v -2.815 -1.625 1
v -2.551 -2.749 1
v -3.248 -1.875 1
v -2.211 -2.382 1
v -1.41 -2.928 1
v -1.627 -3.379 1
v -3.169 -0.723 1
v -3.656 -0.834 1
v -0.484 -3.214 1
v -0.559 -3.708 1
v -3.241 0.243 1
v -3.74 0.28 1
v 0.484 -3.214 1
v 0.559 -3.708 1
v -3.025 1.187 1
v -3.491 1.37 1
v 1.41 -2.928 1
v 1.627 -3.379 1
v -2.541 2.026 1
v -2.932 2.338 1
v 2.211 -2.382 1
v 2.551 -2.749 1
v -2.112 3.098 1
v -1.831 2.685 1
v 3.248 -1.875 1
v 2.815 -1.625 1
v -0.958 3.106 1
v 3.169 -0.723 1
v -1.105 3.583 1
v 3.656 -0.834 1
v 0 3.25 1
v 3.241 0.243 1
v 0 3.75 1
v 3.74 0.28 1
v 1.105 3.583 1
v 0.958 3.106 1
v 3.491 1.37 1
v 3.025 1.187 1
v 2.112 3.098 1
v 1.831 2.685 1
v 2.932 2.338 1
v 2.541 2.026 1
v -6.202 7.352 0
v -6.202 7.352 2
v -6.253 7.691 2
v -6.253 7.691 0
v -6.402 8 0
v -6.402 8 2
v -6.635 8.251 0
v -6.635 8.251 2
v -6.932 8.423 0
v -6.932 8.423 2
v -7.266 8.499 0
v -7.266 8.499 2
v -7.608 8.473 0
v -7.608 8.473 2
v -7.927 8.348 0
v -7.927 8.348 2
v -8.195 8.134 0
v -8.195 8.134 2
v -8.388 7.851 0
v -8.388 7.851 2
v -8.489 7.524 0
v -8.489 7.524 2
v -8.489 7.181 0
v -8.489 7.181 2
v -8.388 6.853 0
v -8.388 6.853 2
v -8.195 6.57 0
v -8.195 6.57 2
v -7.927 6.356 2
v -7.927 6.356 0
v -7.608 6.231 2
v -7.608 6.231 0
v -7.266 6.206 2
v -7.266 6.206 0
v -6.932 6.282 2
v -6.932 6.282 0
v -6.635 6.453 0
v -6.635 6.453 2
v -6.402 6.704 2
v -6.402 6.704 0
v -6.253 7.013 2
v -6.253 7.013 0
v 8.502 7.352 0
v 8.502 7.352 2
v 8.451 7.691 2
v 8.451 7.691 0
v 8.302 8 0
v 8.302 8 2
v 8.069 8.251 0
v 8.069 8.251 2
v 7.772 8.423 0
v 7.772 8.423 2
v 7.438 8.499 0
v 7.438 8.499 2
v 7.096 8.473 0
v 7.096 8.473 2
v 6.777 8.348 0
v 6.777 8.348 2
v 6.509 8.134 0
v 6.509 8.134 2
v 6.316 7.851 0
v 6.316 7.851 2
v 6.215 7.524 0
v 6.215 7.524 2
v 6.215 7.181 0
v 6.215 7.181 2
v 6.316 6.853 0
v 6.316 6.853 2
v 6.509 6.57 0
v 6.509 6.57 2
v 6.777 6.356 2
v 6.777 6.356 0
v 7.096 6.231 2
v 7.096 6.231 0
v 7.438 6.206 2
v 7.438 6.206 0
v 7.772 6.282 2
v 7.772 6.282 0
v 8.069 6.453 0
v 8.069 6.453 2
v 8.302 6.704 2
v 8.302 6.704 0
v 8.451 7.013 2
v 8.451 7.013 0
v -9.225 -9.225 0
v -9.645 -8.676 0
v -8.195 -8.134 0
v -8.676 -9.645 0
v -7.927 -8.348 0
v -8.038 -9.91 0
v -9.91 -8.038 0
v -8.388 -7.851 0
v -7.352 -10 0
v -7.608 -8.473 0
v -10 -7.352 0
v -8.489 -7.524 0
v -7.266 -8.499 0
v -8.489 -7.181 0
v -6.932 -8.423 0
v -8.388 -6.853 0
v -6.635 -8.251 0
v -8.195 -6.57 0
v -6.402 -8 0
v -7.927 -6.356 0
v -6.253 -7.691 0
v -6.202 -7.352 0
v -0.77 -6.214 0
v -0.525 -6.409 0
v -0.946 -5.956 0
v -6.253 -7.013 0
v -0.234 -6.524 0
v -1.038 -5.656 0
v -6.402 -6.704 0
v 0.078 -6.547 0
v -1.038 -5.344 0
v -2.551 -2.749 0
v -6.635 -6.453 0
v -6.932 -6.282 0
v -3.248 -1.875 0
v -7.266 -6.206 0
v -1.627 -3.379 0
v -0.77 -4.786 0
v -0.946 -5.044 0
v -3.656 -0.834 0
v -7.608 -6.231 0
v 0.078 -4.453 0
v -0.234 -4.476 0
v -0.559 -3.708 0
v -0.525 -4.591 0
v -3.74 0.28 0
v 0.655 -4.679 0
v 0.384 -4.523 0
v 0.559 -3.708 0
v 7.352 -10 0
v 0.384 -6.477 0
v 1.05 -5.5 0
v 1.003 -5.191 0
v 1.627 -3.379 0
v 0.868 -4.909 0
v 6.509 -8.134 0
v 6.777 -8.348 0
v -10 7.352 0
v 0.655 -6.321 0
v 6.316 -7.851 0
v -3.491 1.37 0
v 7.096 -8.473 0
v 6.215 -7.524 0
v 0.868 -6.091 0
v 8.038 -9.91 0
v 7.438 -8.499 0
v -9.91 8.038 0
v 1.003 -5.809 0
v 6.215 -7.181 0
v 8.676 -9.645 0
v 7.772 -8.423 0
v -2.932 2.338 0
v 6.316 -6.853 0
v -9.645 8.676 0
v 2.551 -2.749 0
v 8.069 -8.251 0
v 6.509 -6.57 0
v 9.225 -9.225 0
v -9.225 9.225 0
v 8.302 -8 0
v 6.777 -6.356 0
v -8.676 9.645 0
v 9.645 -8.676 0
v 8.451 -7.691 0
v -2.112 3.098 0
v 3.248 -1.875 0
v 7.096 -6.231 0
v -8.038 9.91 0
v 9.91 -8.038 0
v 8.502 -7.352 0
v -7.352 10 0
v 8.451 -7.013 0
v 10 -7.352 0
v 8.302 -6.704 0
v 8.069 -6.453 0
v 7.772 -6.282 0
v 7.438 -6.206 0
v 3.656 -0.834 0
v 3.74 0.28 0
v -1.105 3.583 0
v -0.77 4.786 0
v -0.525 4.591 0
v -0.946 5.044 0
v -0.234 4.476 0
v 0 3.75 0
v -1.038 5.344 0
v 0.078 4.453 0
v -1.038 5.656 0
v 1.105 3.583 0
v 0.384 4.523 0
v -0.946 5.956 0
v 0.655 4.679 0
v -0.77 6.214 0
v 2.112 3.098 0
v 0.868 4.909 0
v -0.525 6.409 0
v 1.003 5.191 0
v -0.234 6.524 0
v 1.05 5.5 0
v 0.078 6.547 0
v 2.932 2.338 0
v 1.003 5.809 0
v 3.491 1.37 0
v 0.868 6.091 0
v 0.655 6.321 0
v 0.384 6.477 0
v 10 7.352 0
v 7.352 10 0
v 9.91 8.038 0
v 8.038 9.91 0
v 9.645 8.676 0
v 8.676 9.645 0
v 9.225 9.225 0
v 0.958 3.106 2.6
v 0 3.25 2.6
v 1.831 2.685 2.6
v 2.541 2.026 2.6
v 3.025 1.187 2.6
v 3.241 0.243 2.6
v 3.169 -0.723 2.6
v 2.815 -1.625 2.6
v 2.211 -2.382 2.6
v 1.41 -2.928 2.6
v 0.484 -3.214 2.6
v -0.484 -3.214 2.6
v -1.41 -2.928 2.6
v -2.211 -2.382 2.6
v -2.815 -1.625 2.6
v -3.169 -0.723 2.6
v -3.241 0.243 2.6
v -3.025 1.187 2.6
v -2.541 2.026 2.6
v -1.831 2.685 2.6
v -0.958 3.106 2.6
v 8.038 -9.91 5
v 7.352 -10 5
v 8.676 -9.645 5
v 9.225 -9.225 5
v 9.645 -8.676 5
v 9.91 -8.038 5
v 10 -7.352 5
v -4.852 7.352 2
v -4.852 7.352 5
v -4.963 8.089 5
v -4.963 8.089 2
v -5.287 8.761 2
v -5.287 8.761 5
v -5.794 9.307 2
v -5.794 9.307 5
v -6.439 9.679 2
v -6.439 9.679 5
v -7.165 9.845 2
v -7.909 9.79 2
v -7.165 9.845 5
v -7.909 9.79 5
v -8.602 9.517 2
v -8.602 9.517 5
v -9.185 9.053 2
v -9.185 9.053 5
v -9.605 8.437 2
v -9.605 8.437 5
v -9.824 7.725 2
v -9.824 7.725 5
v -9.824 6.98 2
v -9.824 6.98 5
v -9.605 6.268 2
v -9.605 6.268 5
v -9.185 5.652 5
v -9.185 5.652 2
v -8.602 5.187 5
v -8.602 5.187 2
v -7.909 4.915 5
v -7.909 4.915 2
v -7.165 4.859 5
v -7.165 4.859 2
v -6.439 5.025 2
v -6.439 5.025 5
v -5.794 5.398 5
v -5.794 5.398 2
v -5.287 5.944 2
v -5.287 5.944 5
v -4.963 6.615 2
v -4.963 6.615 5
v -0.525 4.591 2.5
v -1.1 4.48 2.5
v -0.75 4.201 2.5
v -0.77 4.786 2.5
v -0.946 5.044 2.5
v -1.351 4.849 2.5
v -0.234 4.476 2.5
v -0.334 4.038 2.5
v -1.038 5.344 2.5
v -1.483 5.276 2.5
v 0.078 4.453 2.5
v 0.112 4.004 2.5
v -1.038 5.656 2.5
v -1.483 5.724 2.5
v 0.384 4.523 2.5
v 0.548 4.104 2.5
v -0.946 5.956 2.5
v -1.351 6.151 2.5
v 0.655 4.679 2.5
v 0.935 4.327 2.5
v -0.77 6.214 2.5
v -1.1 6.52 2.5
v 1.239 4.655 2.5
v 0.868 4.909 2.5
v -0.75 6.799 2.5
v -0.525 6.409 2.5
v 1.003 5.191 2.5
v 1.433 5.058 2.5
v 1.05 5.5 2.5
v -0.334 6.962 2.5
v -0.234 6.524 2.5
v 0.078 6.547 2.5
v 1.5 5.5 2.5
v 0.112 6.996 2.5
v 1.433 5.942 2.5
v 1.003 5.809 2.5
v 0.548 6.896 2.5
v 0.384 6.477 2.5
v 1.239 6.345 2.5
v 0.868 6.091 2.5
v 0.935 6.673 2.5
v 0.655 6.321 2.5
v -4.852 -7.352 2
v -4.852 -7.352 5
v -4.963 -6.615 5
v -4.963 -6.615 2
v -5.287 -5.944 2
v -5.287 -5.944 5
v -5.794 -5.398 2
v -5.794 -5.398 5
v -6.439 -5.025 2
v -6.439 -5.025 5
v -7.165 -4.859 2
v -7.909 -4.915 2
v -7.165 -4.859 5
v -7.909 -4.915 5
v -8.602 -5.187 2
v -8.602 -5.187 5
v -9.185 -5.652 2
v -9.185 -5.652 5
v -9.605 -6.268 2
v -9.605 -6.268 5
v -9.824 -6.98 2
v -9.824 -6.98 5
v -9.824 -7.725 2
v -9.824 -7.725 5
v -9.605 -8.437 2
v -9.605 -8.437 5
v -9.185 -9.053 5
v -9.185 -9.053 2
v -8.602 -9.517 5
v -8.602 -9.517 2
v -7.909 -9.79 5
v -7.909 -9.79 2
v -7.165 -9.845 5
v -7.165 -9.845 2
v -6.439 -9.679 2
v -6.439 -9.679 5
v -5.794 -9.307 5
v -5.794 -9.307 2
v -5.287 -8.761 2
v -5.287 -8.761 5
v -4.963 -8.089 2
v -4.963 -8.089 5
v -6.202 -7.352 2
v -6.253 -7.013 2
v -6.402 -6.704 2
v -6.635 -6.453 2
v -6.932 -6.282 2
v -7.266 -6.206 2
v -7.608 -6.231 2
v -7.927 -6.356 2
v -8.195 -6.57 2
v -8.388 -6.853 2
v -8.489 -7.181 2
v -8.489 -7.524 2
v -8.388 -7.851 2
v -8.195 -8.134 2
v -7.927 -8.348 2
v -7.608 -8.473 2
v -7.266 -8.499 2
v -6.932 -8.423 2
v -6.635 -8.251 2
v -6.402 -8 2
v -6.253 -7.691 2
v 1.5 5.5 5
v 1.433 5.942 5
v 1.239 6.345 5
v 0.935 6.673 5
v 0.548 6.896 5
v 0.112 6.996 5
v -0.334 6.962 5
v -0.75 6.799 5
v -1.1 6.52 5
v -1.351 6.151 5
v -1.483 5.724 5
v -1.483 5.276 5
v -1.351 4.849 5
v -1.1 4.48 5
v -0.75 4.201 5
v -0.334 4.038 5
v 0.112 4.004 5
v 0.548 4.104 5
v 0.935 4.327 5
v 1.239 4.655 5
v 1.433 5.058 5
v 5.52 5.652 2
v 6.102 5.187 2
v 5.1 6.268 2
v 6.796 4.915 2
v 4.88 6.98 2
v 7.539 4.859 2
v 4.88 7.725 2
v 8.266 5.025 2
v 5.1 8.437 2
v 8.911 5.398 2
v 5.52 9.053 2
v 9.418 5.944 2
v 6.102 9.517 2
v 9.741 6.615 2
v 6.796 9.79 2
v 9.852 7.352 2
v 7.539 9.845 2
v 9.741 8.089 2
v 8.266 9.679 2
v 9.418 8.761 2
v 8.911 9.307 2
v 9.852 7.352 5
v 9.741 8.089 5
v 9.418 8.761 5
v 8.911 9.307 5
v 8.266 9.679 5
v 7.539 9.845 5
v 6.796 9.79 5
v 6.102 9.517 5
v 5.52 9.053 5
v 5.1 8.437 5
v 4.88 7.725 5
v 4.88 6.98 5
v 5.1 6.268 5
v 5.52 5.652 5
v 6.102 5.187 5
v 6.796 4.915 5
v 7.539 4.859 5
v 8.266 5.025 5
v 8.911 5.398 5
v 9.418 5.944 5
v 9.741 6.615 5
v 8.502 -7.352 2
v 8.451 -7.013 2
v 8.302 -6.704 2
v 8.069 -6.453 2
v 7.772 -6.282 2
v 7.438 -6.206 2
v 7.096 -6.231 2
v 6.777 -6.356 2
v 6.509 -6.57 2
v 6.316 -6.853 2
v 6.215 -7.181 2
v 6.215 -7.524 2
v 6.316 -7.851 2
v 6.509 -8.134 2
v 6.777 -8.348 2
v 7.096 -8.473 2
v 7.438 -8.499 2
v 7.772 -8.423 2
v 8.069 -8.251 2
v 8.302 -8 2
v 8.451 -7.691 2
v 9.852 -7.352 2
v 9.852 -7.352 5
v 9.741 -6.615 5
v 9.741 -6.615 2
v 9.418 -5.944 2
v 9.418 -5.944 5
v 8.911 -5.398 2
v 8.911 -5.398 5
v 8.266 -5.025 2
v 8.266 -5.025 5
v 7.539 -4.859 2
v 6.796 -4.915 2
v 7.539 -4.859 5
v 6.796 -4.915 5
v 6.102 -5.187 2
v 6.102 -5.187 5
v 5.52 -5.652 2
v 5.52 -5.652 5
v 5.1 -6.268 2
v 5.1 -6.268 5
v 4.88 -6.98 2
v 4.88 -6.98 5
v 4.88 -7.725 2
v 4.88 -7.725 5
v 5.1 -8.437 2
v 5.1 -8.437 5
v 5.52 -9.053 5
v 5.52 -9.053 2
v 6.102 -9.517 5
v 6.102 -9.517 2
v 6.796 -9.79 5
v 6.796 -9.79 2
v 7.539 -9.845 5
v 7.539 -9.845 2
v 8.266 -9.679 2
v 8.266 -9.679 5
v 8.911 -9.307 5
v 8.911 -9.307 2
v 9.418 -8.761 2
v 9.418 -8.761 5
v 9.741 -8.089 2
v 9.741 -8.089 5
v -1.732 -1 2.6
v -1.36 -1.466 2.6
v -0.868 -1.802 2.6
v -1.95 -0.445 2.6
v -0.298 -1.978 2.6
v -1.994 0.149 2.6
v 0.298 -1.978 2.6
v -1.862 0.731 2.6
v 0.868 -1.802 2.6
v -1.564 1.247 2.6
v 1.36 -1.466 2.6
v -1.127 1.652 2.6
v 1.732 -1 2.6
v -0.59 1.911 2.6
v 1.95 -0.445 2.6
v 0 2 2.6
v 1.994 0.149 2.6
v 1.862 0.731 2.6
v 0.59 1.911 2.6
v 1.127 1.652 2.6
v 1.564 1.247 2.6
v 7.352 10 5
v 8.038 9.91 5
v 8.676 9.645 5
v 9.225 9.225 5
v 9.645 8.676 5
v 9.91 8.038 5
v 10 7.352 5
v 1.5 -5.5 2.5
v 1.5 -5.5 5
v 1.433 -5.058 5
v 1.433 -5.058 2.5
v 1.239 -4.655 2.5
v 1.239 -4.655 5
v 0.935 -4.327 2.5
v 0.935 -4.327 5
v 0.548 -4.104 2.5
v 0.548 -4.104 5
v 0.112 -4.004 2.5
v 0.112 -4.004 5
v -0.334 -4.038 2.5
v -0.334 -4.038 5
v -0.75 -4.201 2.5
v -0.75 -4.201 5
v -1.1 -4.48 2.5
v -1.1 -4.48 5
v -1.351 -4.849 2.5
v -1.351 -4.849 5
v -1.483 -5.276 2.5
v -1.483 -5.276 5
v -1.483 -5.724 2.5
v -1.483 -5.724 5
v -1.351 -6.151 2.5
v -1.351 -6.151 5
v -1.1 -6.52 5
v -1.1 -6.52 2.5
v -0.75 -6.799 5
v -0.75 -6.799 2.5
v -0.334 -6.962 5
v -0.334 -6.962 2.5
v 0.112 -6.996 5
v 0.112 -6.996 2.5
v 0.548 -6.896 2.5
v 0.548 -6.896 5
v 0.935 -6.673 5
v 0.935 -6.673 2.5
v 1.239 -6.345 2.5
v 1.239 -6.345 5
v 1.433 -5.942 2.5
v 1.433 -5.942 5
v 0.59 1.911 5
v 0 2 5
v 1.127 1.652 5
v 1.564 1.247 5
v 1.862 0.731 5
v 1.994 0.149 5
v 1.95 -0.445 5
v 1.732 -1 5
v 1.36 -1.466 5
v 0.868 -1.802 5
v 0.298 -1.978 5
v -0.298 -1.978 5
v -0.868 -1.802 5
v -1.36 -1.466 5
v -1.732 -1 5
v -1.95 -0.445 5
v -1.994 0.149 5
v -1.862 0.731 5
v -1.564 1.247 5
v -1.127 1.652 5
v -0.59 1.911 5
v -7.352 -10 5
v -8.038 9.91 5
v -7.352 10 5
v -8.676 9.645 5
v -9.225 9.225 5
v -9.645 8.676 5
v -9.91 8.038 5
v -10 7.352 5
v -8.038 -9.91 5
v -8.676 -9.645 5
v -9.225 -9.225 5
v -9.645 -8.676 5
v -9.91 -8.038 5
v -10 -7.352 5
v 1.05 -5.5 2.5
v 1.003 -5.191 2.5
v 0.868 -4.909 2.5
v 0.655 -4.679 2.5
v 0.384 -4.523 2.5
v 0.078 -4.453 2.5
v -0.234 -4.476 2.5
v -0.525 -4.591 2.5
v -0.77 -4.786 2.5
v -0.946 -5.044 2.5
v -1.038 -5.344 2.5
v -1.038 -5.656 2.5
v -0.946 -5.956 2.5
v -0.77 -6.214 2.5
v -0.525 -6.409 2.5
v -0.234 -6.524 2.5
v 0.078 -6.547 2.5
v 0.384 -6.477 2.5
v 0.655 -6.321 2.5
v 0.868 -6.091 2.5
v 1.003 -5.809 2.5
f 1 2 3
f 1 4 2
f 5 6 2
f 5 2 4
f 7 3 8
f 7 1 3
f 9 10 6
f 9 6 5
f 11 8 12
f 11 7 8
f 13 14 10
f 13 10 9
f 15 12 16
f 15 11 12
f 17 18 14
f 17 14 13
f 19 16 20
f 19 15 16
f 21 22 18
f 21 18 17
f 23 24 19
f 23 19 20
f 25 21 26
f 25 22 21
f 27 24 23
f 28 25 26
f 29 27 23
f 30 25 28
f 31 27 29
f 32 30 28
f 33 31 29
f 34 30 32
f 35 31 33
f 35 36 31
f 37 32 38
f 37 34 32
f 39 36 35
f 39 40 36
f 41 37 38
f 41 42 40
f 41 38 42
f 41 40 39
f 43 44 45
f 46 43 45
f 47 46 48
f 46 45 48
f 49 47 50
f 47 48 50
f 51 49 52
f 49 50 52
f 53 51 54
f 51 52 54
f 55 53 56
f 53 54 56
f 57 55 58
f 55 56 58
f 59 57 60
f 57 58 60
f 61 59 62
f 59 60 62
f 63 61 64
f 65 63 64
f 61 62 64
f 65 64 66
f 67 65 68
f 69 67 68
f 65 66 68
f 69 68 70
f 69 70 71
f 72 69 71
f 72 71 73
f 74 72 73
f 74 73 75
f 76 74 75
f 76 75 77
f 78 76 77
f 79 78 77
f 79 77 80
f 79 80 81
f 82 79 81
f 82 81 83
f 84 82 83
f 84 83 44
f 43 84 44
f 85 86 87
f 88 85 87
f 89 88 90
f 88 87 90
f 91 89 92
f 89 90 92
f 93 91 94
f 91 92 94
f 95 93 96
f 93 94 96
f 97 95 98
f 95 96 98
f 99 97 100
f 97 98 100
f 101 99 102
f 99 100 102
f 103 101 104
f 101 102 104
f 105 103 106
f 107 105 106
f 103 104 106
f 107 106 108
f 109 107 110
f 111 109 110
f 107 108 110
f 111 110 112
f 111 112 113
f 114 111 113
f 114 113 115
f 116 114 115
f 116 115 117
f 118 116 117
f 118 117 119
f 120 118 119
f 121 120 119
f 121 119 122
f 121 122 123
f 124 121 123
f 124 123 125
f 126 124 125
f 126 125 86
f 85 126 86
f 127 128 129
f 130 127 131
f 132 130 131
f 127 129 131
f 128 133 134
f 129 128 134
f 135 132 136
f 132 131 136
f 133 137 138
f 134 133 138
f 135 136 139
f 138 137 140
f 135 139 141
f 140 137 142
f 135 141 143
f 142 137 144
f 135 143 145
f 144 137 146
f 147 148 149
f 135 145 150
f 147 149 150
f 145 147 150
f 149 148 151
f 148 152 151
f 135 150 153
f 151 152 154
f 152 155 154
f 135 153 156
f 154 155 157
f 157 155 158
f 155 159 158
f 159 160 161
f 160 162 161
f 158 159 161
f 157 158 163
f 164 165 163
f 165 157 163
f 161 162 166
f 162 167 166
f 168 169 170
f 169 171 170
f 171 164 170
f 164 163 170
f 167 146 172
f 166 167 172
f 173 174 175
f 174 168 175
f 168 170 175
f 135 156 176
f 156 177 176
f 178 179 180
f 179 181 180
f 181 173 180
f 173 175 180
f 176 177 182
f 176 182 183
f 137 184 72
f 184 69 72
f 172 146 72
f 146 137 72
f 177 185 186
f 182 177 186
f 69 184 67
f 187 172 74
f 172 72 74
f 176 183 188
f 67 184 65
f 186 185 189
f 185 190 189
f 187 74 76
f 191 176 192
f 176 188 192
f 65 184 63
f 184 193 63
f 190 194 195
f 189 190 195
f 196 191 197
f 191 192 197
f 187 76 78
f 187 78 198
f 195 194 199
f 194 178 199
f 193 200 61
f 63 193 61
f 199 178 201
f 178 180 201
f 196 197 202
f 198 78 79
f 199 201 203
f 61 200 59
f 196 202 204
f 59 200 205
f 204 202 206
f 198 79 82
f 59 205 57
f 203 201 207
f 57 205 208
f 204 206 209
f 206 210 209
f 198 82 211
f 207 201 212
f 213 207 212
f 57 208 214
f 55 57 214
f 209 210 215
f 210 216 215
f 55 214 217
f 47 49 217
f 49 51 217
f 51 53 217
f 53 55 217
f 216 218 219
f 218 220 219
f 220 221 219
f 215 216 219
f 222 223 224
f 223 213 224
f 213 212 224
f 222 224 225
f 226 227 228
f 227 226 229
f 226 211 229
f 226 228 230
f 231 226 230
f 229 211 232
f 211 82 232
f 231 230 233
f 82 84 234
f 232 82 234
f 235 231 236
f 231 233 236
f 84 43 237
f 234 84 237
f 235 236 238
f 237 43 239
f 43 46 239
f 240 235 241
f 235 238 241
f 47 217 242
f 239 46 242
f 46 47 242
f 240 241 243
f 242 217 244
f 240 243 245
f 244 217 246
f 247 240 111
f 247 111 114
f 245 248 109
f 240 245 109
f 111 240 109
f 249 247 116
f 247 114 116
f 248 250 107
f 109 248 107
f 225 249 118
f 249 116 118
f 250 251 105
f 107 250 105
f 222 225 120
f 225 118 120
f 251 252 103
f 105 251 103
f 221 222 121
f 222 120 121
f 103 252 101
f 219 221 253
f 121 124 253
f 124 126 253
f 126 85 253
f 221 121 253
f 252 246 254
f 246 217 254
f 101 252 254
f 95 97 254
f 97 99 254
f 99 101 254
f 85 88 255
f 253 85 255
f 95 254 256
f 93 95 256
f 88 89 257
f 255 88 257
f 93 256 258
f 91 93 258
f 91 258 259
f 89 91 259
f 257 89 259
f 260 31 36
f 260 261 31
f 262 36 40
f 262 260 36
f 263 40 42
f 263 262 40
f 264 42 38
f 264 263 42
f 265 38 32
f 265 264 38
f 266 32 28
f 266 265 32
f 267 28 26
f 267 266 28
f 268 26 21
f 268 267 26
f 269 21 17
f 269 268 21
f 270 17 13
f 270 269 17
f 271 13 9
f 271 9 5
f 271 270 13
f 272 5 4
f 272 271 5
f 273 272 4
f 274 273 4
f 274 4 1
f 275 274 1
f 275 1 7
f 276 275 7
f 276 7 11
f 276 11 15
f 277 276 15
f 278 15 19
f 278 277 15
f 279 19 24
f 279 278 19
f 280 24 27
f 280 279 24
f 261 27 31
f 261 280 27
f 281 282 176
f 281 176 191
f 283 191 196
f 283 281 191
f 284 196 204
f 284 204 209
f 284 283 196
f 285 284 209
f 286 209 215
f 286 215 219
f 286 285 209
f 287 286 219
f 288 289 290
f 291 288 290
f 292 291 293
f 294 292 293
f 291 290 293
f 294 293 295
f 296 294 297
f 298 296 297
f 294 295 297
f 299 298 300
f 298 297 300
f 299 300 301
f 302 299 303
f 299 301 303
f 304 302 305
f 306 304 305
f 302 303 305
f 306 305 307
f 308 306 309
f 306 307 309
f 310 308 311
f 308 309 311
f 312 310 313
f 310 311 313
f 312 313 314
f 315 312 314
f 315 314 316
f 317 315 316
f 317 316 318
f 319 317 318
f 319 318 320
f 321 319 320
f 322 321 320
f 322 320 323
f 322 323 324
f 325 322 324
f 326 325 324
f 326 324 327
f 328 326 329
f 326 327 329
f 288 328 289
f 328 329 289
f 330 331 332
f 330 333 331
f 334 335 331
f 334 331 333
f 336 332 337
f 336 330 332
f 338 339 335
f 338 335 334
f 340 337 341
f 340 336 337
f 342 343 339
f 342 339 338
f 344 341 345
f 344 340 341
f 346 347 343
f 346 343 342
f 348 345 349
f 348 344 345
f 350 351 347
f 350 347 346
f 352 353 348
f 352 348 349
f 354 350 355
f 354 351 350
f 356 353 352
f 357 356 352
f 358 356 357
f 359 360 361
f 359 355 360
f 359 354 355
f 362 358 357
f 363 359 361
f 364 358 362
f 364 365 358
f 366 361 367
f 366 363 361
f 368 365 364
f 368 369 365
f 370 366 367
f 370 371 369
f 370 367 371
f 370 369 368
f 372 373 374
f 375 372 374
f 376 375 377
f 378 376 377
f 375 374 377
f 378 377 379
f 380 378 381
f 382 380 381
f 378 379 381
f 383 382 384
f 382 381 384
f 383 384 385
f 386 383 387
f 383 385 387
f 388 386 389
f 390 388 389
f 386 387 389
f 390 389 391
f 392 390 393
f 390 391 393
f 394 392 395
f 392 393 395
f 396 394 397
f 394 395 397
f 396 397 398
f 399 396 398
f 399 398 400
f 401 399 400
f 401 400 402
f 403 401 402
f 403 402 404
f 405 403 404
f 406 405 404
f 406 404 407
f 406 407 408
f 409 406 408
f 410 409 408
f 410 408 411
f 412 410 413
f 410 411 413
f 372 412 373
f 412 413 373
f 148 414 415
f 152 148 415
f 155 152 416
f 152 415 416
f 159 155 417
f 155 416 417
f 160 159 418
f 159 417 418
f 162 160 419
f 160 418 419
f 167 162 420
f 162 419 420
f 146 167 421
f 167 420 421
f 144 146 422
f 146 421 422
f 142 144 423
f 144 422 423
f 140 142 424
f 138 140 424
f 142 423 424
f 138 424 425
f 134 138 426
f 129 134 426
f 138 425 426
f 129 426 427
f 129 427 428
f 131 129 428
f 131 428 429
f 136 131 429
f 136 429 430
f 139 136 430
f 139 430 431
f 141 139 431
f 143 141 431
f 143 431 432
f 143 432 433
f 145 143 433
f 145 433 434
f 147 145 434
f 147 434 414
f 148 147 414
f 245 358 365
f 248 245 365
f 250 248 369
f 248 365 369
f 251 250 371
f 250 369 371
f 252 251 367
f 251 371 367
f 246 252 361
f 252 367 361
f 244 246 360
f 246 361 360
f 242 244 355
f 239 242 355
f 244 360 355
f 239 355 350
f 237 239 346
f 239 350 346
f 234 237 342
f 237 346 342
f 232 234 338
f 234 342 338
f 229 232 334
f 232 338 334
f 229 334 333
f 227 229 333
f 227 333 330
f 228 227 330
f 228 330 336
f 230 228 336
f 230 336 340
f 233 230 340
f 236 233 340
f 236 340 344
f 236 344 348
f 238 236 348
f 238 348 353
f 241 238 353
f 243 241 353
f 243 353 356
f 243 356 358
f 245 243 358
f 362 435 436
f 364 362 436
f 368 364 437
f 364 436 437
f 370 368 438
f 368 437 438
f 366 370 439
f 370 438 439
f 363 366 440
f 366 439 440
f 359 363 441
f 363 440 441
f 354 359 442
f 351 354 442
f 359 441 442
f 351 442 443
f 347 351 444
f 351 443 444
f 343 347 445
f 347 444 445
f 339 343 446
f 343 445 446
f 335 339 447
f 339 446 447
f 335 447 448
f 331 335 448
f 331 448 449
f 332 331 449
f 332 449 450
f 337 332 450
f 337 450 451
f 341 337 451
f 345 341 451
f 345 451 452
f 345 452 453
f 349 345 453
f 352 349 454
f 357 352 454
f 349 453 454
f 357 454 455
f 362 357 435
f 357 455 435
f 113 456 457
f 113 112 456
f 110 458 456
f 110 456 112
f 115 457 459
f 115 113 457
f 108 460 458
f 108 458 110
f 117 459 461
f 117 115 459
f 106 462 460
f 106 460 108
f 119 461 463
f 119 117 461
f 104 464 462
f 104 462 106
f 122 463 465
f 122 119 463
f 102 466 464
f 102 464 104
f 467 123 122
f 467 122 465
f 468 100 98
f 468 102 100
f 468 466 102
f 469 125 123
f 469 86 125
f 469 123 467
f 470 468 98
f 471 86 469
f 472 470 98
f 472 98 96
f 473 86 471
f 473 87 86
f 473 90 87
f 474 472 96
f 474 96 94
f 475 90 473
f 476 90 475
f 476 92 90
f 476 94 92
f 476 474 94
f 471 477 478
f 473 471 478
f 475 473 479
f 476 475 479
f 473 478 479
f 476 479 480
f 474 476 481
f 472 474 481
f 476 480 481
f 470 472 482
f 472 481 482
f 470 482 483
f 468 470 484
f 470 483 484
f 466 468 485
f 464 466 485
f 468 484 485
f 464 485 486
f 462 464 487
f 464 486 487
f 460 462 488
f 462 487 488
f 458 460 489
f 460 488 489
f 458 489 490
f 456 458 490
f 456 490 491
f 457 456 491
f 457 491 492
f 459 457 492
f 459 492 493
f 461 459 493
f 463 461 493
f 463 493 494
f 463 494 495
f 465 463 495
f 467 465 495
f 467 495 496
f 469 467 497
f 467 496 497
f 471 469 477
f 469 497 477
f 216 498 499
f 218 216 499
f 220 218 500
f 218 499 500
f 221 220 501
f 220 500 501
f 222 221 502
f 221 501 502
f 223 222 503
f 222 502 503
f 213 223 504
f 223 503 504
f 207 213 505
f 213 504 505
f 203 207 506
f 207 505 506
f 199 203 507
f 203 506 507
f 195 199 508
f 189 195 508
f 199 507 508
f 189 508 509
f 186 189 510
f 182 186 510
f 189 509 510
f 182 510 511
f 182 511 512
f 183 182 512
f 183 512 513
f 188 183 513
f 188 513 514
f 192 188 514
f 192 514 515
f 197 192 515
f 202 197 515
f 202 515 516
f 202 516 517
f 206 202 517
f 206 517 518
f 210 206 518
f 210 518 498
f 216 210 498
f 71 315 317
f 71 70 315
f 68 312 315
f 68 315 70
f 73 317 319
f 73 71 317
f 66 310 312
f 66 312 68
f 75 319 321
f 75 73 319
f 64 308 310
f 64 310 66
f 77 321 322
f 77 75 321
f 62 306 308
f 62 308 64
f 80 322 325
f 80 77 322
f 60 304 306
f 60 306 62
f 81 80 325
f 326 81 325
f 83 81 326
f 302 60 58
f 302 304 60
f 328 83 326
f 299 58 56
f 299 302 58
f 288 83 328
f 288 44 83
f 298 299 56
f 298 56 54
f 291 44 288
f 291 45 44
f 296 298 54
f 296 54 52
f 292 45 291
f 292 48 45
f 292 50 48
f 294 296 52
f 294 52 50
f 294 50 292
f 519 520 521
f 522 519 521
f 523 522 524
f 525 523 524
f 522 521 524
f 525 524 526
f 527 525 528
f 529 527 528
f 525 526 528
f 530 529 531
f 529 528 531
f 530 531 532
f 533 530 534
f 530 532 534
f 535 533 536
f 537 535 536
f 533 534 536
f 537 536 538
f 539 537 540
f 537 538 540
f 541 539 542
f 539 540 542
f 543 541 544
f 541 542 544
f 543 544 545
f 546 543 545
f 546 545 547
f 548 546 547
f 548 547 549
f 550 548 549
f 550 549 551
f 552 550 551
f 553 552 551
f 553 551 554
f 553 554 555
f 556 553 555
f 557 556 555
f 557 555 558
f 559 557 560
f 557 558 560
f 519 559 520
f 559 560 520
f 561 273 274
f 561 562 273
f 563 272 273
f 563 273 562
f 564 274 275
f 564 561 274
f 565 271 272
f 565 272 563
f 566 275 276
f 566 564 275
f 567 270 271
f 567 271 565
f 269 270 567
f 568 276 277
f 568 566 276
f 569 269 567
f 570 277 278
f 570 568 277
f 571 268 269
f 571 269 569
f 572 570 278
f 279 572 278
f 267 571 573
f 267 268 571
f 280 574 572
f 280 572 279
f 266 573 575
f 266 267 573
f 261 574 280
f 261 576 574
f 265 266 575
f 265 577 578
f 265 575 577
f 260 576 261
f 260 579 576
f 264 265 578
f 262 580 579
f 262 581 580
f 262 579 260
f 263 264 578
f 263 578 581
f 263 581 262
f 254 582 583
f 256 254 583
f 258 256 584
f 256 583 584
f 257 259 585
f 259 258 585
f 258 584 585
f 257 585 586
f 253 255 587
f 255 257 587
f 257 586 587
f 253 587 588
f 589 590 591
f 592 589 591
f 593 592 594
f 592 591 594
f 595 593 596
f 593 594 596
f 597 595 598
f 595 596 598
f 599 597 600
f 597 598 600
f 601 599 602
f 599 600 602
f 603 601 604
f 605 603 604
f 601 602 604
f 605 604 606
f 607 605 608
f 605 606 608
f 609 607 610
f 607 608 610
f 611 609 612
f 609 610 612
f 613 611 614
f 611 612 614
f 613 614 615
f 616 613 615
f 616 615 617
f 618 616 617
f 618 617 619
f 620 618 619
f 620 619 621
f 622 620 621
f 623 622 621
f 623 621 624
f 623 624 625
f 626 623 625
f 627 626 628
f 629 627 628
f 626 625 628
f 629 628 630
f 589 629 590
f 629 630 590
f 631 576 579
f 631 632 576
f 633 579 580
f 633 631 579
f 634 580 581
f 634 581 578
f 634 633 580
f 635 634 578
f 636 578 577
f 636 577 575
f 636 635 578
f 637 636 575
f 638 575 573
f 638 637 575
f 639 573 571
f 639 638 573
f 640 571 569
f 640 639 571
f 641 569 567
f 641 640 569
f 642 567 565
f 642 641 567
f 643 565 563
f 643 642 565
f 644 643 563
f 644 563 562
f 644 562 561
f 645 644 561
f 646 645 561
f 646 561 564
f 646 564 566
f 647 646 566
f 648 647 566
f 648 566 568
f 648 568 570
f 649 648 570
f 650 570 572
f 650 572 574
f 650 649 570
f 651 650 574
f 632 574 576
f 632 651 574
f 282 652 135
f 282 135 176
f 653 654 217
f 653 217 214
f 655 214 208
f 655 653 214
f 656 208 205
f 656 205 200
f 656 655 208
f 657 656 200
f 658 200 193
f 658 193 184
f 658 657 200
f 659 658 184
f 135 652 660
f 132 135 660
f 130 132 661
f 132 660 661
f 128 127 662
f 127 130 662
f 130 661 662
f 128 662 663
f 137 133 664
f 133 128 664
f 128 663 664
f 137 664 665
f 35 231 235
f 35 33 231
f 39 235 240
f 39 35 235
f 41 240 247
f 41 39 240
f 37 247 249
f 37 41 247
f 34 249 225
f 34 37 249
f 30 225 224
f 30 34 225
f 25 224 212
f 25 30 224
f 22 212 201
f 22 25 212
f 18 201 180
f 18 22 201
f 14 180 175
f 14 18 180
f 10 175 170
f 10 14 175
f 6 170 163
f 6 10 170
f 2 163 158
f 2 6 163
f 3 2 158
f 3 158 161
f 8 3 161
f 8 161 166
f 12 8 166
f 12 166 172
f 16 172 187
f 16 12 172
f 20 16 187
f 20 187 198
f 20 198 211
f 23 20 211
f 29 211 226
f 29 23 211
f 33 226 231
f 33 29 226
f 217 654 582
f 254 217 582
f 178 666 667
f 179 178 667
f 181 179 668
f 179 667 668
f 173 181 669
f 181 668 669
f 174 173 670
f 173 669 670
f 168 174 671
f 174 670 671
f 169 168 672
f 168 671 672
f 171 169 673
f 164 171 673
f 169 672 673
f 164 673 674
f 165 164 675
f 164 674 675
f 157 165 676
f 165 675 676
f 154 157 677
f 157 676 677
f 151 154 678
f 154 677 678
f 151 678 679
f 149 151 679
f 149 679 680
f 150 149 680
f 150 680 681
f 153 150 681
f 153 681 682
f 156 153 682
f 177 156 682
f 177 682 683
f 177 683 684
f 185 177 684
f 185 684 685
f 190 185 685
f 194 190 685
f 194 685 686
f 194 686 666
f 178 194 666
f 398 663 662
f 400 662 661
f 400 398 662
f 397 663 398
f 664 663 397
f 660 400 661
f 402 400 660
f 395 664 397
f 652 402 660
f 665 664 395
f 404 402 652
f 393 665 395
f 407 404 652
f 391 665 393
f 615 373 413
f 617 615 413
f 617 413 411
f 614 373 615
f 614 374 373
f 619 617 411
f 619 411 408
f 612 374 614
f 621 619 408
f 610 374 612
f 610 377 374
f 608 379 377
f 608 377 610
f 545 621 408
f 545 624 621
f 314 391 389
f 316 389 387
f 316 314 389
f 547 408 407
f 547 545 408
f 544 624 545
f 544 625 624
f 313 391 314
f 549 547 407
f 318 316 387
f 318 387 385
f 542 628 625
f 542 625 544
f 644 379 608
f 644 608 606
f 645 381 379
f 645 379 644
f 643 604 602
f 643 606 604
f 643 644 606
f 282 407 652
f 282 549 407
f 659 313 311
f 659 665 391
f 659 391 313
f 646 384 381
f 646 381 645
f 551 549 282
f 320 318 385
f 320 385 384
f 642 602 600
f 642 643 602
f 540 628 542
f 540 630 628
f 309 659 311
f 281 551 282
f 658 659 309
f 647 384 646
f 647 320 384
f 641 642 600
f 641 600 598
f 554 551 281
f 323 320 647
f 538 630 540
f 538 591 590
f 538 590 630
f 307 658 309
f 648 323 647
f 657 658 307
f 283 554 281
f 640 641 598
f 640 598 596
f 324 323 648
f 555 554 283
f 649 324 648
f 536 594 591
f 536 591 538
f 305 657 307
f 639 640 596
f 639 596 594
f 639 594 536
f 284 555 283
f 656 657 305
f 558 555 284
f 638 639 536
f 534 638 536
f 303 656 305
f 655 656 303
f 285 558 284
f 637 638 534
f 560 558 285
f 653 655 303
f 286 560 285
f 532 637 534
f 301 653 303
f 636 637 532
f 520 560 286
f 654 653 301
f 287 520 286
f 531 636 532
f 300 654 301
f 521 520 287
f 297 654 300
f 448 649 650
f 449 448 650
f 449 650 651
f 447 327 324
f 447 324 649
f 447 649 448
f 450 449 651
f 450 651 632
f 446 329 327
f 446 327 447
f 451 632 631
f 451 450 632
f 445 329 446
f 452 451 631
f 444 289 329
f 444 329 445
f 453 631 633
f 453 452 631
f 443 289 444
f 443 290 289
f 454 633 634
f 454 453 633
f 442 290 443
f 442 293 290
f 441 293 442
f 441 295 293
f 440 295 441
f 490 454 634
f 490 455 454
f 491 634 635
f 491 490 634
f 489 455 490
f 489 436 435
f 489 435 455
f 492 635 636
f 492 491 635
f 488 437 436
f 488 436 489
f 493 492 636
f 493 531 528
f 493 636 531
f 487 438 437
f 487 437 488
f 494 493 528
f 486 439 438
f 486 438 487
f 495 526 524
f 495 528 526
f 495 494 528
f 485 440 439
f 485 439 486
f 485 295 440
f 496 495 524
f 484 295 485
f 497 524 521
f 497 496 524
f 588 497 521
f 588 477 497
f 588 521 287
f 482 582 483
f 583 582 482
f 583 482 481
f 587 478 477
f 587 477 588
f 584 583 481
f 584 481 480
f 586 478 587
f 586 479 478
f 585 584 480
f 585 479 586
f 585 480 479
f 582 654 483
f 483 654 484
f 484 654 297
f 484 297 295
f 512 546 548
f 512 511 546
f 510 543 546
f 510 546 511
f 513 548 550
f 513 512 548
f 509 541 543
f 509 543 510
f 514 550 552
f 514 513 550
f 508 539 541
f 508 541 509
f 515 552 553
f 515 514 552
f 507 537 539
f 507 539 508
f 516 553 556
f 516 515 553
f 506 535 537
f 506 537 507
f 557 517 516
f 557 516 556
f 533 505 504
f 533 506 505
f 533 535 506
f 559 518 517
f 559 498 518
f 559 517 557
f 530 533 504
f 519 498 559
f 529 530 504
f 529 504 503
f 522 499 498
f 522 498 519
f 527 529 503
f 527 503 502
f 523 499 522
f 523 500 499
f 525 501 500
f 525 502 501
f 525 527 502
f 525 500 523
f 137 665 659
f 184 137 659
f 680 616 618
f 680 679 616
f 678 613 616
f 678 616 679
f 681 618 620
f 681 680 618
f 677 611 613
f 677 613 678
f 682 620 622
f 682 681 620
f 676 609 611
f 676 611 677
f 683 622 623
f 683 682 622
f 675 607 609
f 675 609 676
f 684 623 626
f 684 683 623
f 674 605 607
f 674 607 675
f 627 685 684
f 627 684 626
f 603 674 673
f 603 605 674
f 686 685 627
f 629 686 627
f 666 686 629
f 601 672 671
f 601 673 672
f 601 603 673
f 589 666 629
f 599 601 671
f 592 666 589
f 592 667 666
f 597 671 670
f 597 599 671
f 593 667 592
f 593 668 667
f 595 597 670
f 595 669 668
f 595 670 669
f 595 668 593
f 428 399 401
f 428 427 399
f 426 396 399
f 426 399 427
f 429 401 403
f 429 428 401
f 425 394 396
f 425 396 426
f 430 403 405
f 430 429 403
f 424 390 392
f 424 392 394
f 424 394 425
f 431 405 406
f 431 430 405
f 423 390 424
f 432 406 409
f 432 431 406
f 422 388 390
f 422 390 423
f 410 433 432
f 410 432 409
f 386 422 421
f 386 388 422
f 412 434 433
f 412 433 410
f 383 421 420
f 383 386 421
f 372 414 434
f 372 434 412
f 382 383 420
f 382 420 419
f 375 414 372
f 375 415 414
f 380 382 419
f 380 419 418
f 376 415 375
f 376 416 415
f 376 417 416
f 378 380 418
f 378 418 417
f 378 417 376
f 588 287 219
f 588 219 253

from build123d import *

# Parameters (mm, degrees)
SKIZZE3_W                       = 20
SKIZZE3_H                       = 20
SKIZZE3_R                       = 7.5
AUFSATZ_LINEAR_AUSTRAGEN2_DEPTH = 5
SKIZZE4_R                       = 1.05
SCHNITT_LINEAR_AUSTRAGEN1_DEPTH = 6
SKIZZE5_R                       = 1.5
SCHNITT_LINEAR_AUSTRAGEN2_DEPTH = 2.5
SCHNITT_LINEAR_AUSTRAGEN3_DEPTH = 6
SKIZZE7_R                       = 1.15
SCHNITT_LINEAR_AUSTRAGEN4_DEPTH = 6
SKIZZE8_R                       = 2.5
SCHNITT_LINEAR_AUSTRAGEN5_DEPTH = 3


with BuildPart() as part:
    # Skizze2 → Rotation1 (revolve)
    with BuildSketch(Plane(origin=(0, 0, 0), x_dir=(0, 0, -1), z_dir=(1, 0, 0))):
        Polygon((0, 3.75), (-1, 3.75), (-1, 3.25), (-2.6, 3.25), (-2.6, 2), (-5, 2), (-5, 7.5), (0, 7.5), align=None)
    revolve(axis=Axis((0, 0, 12.6), (0, 0, -1)))

    # Skizze3 → Aufsatz-Linear austragen2 (add, through all)
    with BuildSketch(Plane.XY.offset(5)):
        Rectangle(SKIZZE3_W, SKIZZE3_H)
        Circle(SKIZZE3_R, mode=Mode.SUBTRACT)
    extrude(amount=-AUFSATZ_LINEAR_AUSTRAGEN2_DEPTH)

    # Skizze4 → Schnitt-Linear austragen1 (cut, through all)
    with BuildSketch(Plane.XY.offset(5)):
        with Locations((0, 5.5)):
            Circle(SKIZZE4_R)
        with Locations((0, -5.5)):
            Circle(SKIZZE4_R)
    extrude(amount=-SCHNITT_LINEAR_AUSTRAGEN1_DEPTH, mode=Mode.SUBTRACT)

    # Skizze5 → Schnitt-Linear austragen2 (cut)
    with BuildSketch(Plane.XY.offset(5)):
        with Locations((0, 5.5)):
            Circle(SKIZZE5_R)
        with Locations((0, -5.5)):
            Circle(SKIZZE5_R)
    extrude(amount=-SCHNITT_LINEAR_AUSTRAGEN2_DEPTH, mode=Mode.SUBTRACT)

    # Skizze6 → Schnitt-Linear austragen3 (cut, through all)
    with BuildSketch(Plane.XY.offset(5)):
        with BuildLine():
            Line((-10, 7.352290732), (-10.887824638, 7.352290732))
            Line((-10.887824638, 7.352290732), (-10.887824638, 10.887824638))
            Line((-10.887824638, 10.887824638), (-7.352290732, 10.887824638))
            Line((-7.352290732, 10.887824638), (-7.352290732, 10))
            ThreePointArc((-7.352290732, 10), (-9.22450391, 9.22450391), (-10, 7.352290732))
        make_face()
        with BuildLine():
            Line((7.352290732, 10.887824638), (7.352290732, 10))
            ThreePointArc((7.352290732, 10), (9.22450391, 9.22450391), (10, 7.352290732))
            Line((10, 7.352290732), (10.887824638, 7.352290732))
            Line((10.887824638, 7.352290732), (10.887824638, 10.887824638))
            Line((10.887824638, 10.887824638), (7.352290732, 10.887824638))
        make_face()
        with BuildLine():
            Line((10, -7.352290732), (10.887824638, -7.352290732))
            Line((10.887824638, -7.352290732), (10.887824638, -10.887824638))
            Line((10.887824638, -10.887824638), (7.352290732, -10.887824638))
            Line((7.352290732, -10.887824638), (7.352290732, -10))
            ThreePointArc((7.352290732, -10), (9.22450391, -9.22450391), (10, -7.352290732))
        make_face()
        with BuildLine():
            Line((-7.352290732, -10.887824638), (-7.352290732, -10))
            ThreePointArc((-7.352290732, -10), (-9.22450391, -9.22450391), (-10, -7.352290732))
            Line((-10, -7.352290732), (-10.887824638, -7.352290732))
            Line((-10.887824638, -7.352290732), (-10.887824638, -10.887824638))
            Line((-10.887824638, -10.887824638), (-7.352290732, -10.887824638))
        make_face()
    extrude(amount=-SCHNITT_LINEAR_AUSTRAGEN3_DEPTH, mode=Mode.SUBTRACT)

    # Skizze7 → Schnitt-Linear austragen4 (cut, through all)
    with BuildSketch(Plane.XY.offset(5)):
        with Locations((-7.352290732, 7.352290732)):
            Circle(SKIZZE7_R)
        with Locations((7.352290732, 7.352290732)):
            Circle(SKIZZE7_R)
        with Locations((7.352290732, -7.352290732)):
            Circle(SKIZZE7_R)
        with Locations((-7.352290732, -7.352290732)):
            Circle(SKIZZE7_R)
    extrude(amount=-SCHNITT_LINEAR_AUSTRAGEN4_DEPTH, mode=Mode.SUBTRACT)

    # Skizze8 → Schnitt-Linear austragen5 (cut)
    with BuildSketch(Plane.XY.offset(5)):
        with Locations((-7.352290732, 7.352290732)):
            Circle(SKIZZE8_R)
        with Locations((7.352290732, 7.352290732)):
            Circle(SKIZZE8_R)
        with Locations((7.352290732, -7.352290732)):
            Circle(SKIZZE8_R)
        with Locations((-7.352290732, -7.352290732)):
            Circle(SKIZZE8_R)
    extrude(amount=-SCHNITT_LINEAR_AUSTRAGEN5_DEPTH, mode=Mode.SUBTRACT)


solid = part.part
